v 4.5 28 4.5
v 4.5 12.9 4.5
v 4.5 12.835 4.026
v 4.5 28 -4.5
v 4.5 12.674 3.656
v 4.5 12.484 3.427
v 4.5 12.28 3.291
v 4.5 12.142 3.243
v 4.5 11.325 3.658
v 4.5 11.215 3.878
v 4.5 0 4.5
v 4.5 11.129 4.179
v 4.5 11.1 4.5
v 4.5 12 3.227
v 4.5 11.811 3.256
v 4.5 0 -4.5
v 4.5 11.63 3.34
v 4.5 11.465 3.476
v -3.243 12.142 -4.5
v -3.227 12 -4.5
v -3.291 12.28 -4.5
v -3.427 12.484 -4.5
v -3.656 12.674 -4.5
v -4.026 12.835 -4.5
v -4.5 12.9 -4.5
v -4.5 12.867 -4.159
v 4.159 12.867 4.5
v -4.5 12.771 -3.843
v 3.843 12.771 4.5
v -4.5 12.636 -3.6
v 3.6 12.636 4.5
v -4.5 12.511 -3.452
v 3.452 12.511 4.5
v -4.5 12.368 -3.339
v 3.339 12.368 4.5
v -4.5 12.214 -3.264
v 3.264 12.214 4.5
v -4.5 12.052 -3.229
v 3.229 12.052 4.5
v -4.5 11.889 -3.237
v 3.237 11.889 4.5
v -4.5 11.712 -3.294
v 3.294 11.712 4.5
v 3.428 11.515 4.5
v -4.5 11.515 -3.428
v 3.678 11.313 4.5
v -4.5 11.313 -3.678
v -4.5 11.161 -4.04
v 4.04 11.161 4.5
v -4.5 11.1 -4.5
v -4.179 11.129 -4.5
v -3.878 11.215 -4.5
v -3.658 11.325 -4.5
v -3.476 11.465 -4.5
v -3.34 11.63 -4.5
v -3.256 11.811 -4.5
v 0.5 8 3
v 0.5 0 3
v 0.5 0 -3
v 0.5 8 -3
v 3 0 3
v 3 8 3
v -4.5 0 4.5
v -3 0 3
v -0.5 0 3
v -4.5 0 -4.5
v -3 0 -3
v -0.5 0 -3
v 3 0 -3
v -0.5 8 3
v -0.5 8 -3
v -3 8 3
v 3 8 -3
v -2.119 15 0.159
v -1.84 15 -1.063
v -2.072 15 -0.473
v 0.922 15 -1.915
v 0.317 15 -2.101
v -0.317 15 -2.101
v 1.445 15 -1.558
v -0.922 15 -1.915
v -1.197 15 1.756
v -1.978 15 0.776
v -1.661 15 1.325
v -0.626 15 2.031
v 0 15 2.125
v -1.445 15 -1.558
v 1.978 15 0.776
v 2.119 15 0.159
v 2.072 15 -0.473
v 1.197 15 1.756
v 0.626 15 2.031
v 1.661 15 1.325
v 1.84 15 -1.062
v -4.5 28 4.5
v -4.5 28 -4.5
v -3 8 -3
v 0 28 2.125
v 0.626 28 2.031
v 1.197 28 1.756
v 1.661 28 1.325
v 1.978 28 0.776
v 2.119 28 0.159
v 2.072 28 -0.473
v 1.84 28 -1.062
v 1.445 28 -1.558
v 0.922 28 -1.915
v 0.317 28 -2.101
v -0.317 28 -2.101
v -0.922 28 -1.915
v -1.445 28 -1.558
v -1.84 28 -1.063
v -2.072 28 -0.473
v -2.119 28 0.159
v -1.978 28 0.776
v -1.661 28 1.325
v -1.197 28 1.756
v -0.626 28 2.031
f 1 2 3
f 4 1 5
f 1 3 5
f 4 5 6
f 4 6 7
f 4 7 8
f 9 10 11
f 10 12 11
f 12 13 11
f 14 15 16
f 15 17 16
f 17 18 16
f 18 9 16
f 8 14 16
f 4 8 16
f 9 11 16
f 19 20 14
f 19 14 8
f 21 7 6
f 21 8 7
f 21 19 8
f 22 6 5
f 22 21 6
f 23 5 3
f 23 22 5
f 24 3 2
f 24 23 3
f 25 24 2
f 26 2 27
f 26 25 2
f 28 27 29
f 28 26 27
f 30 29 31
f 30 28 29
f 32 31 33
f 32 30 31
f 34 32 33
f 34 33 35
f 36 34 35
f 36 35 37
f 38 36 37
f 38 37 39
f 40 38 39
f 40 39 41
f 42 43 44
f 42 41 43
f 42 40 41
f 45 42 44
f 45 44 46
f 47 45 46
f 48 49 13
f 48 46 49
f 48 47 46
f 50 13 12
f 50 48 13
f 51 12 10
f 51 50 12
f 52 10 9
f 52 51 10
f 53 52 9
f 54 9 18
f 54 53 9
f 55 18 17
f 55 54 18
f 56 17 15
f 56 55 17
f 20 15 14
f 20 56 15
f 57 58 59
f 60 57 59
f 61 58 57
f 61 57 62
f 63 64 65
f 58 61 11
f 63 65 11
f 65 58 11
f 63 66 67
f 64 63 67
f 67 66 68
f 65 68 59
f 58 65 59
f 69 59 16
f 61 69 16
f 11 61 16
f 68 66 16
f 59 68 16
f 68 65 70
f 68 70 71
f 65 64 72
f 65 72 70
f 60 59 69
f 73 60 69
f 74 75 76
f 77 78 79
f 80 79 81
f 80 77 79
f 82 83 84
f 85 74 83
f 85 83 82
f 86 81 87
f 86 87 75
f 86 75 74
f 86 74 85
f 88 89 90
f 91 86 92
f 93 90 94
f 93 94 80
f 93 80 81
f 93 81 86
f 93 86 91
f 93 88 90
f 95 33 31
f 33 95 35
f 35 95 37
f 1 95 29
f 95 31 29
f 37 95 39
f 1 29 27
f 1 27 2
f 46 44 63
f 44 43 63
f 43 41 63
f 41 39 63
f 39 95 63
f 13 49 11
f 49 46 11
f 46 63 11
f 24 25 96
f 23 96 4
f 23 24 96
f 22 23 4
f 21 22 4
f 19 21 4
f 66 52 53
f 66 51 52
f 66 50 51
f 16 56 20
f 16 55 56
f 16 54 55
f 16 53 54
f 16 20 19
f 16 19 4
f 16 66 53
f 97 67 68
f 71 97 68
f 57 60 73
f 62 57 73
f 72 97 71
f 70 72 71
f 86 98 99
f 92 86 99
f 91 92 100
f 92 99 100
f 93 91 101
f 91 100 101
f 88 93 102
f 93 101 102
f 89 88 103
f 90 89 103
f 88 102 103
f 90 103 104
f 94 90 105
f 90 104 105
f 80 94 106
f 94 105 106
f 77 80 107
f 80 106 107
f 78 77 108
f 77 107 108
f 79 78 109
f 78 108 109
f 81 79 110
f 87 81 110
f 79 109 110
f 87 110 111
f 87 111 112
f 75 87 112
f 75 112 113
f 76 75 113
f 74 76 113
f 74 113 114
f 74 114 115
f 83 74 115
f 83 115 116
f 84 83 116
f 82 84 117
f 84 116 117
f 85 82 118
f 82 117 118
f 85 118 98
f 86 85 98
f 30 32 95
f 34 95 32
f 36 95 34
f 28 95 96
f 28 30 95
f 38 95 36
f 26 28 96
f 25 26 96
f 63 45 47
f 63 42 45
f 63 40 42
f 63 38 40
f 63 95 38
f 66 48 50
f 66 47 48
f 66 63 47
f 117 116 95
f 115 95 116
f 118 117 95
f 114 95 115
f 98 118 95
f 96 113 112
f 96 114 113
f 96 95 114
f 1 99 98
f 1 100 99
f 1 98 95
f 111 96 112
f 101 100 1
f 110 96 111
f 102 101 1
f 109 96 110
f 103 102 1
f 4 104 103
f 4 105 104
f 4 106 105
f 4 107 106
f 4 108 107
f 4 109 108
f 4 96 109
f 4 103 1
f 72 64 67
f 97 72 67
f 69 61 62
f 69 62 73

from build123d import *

# Parameters (mm, degrees)
SKETCH1_W              = 9
SKETCH1_H              = 9
SKETCH1_W_2            = 2.5
SKETCH1_H_2            = 6
BOSS_EXTRUDE1_DEPTH    = 8
SKETCH2_W              = 9
SKETCH2_H              = 9
BOSS_EXTRUDE2_DEPTH    = 20
SKETCH3_R              = 2.125
CUT_EXTRUDE2_DEPTH     = 13
CUT_EXTRUDE4_START     = -6.363961131
CUT_EXTRUDE4_OUTLINE_R = 0.9
CUT_EXTRUDE4_DEPTH     = 12.727922262


# Read off the part's stored shape, not the designer's step: Cut-Extrude4
with BuildPart() as part:
    # Sketch1 → Boss-Extrude1 (new body)
    with BuildSketch(Plane(origin=(0, 0, 0), x_dir=(1, 0, 0), z_dir=(0, 1, 0))):
        Rectangle(SKETCH1_W, SKETCH1_H)
        with Locations((-1.75, 0)):
            Rectangle(SKETCH1_W_2, SKETCH1_H_2, mode=Mode.SUBTRACT)
        with Locations((1.75, 0)):
            Rectangle(SKETCH1_W_2, SKETCH1_H_2, mode=Mode.SUBTRACT)
    extrude(amount=BOSS_EXTRUDE1_DEPTH)

    # Sketch2 → Boss-Extrude2 (add)
    with BuildSketch(Plane(origin=(0, 8, 0), x_dir=(1, 0, 0), z_dir=(0, 1, 0))):
        Rectangle(SKETCH2_W, SKETCH2_H)
    extrude(amount=BOSS_EXTRUDE2_DEPTH)

    # Sketch3 → Cut-Extrude2 (cut)
    with BuildSketch(Plane(origin=(0, 28, 0), x_dir=(1, 0, 0), z_dir=(0, 1, 0))):
        with Locations(Location((0, 0, 0), (0, 0, 270))):
            Circle(SKETCH3_R)
    extrude(amount=-CUT_EXTRUDE2_DEPTH, mode=Mode.SUBTRACT)

    # Cut-Extrude4 outline → Cut-Extrude4 (cut)
    with BuildSketch(Plane(origin=(0, 0, 0), x_dir=(0.707106781186548, 0, -0.707106781186547), z_dir=(0.707106781186547, 0, 0.707106781186548)).offset(CUT_EXTRUDE4_START)):
        with Locations((0, 12)):
            Circle(CUT_EXTRUDE4_OUTLINE_R)
    extrude(amount=CUT_EXTRUDE4_DEPTH, mode=Mode.SUBTRACT)


solid = part.part
